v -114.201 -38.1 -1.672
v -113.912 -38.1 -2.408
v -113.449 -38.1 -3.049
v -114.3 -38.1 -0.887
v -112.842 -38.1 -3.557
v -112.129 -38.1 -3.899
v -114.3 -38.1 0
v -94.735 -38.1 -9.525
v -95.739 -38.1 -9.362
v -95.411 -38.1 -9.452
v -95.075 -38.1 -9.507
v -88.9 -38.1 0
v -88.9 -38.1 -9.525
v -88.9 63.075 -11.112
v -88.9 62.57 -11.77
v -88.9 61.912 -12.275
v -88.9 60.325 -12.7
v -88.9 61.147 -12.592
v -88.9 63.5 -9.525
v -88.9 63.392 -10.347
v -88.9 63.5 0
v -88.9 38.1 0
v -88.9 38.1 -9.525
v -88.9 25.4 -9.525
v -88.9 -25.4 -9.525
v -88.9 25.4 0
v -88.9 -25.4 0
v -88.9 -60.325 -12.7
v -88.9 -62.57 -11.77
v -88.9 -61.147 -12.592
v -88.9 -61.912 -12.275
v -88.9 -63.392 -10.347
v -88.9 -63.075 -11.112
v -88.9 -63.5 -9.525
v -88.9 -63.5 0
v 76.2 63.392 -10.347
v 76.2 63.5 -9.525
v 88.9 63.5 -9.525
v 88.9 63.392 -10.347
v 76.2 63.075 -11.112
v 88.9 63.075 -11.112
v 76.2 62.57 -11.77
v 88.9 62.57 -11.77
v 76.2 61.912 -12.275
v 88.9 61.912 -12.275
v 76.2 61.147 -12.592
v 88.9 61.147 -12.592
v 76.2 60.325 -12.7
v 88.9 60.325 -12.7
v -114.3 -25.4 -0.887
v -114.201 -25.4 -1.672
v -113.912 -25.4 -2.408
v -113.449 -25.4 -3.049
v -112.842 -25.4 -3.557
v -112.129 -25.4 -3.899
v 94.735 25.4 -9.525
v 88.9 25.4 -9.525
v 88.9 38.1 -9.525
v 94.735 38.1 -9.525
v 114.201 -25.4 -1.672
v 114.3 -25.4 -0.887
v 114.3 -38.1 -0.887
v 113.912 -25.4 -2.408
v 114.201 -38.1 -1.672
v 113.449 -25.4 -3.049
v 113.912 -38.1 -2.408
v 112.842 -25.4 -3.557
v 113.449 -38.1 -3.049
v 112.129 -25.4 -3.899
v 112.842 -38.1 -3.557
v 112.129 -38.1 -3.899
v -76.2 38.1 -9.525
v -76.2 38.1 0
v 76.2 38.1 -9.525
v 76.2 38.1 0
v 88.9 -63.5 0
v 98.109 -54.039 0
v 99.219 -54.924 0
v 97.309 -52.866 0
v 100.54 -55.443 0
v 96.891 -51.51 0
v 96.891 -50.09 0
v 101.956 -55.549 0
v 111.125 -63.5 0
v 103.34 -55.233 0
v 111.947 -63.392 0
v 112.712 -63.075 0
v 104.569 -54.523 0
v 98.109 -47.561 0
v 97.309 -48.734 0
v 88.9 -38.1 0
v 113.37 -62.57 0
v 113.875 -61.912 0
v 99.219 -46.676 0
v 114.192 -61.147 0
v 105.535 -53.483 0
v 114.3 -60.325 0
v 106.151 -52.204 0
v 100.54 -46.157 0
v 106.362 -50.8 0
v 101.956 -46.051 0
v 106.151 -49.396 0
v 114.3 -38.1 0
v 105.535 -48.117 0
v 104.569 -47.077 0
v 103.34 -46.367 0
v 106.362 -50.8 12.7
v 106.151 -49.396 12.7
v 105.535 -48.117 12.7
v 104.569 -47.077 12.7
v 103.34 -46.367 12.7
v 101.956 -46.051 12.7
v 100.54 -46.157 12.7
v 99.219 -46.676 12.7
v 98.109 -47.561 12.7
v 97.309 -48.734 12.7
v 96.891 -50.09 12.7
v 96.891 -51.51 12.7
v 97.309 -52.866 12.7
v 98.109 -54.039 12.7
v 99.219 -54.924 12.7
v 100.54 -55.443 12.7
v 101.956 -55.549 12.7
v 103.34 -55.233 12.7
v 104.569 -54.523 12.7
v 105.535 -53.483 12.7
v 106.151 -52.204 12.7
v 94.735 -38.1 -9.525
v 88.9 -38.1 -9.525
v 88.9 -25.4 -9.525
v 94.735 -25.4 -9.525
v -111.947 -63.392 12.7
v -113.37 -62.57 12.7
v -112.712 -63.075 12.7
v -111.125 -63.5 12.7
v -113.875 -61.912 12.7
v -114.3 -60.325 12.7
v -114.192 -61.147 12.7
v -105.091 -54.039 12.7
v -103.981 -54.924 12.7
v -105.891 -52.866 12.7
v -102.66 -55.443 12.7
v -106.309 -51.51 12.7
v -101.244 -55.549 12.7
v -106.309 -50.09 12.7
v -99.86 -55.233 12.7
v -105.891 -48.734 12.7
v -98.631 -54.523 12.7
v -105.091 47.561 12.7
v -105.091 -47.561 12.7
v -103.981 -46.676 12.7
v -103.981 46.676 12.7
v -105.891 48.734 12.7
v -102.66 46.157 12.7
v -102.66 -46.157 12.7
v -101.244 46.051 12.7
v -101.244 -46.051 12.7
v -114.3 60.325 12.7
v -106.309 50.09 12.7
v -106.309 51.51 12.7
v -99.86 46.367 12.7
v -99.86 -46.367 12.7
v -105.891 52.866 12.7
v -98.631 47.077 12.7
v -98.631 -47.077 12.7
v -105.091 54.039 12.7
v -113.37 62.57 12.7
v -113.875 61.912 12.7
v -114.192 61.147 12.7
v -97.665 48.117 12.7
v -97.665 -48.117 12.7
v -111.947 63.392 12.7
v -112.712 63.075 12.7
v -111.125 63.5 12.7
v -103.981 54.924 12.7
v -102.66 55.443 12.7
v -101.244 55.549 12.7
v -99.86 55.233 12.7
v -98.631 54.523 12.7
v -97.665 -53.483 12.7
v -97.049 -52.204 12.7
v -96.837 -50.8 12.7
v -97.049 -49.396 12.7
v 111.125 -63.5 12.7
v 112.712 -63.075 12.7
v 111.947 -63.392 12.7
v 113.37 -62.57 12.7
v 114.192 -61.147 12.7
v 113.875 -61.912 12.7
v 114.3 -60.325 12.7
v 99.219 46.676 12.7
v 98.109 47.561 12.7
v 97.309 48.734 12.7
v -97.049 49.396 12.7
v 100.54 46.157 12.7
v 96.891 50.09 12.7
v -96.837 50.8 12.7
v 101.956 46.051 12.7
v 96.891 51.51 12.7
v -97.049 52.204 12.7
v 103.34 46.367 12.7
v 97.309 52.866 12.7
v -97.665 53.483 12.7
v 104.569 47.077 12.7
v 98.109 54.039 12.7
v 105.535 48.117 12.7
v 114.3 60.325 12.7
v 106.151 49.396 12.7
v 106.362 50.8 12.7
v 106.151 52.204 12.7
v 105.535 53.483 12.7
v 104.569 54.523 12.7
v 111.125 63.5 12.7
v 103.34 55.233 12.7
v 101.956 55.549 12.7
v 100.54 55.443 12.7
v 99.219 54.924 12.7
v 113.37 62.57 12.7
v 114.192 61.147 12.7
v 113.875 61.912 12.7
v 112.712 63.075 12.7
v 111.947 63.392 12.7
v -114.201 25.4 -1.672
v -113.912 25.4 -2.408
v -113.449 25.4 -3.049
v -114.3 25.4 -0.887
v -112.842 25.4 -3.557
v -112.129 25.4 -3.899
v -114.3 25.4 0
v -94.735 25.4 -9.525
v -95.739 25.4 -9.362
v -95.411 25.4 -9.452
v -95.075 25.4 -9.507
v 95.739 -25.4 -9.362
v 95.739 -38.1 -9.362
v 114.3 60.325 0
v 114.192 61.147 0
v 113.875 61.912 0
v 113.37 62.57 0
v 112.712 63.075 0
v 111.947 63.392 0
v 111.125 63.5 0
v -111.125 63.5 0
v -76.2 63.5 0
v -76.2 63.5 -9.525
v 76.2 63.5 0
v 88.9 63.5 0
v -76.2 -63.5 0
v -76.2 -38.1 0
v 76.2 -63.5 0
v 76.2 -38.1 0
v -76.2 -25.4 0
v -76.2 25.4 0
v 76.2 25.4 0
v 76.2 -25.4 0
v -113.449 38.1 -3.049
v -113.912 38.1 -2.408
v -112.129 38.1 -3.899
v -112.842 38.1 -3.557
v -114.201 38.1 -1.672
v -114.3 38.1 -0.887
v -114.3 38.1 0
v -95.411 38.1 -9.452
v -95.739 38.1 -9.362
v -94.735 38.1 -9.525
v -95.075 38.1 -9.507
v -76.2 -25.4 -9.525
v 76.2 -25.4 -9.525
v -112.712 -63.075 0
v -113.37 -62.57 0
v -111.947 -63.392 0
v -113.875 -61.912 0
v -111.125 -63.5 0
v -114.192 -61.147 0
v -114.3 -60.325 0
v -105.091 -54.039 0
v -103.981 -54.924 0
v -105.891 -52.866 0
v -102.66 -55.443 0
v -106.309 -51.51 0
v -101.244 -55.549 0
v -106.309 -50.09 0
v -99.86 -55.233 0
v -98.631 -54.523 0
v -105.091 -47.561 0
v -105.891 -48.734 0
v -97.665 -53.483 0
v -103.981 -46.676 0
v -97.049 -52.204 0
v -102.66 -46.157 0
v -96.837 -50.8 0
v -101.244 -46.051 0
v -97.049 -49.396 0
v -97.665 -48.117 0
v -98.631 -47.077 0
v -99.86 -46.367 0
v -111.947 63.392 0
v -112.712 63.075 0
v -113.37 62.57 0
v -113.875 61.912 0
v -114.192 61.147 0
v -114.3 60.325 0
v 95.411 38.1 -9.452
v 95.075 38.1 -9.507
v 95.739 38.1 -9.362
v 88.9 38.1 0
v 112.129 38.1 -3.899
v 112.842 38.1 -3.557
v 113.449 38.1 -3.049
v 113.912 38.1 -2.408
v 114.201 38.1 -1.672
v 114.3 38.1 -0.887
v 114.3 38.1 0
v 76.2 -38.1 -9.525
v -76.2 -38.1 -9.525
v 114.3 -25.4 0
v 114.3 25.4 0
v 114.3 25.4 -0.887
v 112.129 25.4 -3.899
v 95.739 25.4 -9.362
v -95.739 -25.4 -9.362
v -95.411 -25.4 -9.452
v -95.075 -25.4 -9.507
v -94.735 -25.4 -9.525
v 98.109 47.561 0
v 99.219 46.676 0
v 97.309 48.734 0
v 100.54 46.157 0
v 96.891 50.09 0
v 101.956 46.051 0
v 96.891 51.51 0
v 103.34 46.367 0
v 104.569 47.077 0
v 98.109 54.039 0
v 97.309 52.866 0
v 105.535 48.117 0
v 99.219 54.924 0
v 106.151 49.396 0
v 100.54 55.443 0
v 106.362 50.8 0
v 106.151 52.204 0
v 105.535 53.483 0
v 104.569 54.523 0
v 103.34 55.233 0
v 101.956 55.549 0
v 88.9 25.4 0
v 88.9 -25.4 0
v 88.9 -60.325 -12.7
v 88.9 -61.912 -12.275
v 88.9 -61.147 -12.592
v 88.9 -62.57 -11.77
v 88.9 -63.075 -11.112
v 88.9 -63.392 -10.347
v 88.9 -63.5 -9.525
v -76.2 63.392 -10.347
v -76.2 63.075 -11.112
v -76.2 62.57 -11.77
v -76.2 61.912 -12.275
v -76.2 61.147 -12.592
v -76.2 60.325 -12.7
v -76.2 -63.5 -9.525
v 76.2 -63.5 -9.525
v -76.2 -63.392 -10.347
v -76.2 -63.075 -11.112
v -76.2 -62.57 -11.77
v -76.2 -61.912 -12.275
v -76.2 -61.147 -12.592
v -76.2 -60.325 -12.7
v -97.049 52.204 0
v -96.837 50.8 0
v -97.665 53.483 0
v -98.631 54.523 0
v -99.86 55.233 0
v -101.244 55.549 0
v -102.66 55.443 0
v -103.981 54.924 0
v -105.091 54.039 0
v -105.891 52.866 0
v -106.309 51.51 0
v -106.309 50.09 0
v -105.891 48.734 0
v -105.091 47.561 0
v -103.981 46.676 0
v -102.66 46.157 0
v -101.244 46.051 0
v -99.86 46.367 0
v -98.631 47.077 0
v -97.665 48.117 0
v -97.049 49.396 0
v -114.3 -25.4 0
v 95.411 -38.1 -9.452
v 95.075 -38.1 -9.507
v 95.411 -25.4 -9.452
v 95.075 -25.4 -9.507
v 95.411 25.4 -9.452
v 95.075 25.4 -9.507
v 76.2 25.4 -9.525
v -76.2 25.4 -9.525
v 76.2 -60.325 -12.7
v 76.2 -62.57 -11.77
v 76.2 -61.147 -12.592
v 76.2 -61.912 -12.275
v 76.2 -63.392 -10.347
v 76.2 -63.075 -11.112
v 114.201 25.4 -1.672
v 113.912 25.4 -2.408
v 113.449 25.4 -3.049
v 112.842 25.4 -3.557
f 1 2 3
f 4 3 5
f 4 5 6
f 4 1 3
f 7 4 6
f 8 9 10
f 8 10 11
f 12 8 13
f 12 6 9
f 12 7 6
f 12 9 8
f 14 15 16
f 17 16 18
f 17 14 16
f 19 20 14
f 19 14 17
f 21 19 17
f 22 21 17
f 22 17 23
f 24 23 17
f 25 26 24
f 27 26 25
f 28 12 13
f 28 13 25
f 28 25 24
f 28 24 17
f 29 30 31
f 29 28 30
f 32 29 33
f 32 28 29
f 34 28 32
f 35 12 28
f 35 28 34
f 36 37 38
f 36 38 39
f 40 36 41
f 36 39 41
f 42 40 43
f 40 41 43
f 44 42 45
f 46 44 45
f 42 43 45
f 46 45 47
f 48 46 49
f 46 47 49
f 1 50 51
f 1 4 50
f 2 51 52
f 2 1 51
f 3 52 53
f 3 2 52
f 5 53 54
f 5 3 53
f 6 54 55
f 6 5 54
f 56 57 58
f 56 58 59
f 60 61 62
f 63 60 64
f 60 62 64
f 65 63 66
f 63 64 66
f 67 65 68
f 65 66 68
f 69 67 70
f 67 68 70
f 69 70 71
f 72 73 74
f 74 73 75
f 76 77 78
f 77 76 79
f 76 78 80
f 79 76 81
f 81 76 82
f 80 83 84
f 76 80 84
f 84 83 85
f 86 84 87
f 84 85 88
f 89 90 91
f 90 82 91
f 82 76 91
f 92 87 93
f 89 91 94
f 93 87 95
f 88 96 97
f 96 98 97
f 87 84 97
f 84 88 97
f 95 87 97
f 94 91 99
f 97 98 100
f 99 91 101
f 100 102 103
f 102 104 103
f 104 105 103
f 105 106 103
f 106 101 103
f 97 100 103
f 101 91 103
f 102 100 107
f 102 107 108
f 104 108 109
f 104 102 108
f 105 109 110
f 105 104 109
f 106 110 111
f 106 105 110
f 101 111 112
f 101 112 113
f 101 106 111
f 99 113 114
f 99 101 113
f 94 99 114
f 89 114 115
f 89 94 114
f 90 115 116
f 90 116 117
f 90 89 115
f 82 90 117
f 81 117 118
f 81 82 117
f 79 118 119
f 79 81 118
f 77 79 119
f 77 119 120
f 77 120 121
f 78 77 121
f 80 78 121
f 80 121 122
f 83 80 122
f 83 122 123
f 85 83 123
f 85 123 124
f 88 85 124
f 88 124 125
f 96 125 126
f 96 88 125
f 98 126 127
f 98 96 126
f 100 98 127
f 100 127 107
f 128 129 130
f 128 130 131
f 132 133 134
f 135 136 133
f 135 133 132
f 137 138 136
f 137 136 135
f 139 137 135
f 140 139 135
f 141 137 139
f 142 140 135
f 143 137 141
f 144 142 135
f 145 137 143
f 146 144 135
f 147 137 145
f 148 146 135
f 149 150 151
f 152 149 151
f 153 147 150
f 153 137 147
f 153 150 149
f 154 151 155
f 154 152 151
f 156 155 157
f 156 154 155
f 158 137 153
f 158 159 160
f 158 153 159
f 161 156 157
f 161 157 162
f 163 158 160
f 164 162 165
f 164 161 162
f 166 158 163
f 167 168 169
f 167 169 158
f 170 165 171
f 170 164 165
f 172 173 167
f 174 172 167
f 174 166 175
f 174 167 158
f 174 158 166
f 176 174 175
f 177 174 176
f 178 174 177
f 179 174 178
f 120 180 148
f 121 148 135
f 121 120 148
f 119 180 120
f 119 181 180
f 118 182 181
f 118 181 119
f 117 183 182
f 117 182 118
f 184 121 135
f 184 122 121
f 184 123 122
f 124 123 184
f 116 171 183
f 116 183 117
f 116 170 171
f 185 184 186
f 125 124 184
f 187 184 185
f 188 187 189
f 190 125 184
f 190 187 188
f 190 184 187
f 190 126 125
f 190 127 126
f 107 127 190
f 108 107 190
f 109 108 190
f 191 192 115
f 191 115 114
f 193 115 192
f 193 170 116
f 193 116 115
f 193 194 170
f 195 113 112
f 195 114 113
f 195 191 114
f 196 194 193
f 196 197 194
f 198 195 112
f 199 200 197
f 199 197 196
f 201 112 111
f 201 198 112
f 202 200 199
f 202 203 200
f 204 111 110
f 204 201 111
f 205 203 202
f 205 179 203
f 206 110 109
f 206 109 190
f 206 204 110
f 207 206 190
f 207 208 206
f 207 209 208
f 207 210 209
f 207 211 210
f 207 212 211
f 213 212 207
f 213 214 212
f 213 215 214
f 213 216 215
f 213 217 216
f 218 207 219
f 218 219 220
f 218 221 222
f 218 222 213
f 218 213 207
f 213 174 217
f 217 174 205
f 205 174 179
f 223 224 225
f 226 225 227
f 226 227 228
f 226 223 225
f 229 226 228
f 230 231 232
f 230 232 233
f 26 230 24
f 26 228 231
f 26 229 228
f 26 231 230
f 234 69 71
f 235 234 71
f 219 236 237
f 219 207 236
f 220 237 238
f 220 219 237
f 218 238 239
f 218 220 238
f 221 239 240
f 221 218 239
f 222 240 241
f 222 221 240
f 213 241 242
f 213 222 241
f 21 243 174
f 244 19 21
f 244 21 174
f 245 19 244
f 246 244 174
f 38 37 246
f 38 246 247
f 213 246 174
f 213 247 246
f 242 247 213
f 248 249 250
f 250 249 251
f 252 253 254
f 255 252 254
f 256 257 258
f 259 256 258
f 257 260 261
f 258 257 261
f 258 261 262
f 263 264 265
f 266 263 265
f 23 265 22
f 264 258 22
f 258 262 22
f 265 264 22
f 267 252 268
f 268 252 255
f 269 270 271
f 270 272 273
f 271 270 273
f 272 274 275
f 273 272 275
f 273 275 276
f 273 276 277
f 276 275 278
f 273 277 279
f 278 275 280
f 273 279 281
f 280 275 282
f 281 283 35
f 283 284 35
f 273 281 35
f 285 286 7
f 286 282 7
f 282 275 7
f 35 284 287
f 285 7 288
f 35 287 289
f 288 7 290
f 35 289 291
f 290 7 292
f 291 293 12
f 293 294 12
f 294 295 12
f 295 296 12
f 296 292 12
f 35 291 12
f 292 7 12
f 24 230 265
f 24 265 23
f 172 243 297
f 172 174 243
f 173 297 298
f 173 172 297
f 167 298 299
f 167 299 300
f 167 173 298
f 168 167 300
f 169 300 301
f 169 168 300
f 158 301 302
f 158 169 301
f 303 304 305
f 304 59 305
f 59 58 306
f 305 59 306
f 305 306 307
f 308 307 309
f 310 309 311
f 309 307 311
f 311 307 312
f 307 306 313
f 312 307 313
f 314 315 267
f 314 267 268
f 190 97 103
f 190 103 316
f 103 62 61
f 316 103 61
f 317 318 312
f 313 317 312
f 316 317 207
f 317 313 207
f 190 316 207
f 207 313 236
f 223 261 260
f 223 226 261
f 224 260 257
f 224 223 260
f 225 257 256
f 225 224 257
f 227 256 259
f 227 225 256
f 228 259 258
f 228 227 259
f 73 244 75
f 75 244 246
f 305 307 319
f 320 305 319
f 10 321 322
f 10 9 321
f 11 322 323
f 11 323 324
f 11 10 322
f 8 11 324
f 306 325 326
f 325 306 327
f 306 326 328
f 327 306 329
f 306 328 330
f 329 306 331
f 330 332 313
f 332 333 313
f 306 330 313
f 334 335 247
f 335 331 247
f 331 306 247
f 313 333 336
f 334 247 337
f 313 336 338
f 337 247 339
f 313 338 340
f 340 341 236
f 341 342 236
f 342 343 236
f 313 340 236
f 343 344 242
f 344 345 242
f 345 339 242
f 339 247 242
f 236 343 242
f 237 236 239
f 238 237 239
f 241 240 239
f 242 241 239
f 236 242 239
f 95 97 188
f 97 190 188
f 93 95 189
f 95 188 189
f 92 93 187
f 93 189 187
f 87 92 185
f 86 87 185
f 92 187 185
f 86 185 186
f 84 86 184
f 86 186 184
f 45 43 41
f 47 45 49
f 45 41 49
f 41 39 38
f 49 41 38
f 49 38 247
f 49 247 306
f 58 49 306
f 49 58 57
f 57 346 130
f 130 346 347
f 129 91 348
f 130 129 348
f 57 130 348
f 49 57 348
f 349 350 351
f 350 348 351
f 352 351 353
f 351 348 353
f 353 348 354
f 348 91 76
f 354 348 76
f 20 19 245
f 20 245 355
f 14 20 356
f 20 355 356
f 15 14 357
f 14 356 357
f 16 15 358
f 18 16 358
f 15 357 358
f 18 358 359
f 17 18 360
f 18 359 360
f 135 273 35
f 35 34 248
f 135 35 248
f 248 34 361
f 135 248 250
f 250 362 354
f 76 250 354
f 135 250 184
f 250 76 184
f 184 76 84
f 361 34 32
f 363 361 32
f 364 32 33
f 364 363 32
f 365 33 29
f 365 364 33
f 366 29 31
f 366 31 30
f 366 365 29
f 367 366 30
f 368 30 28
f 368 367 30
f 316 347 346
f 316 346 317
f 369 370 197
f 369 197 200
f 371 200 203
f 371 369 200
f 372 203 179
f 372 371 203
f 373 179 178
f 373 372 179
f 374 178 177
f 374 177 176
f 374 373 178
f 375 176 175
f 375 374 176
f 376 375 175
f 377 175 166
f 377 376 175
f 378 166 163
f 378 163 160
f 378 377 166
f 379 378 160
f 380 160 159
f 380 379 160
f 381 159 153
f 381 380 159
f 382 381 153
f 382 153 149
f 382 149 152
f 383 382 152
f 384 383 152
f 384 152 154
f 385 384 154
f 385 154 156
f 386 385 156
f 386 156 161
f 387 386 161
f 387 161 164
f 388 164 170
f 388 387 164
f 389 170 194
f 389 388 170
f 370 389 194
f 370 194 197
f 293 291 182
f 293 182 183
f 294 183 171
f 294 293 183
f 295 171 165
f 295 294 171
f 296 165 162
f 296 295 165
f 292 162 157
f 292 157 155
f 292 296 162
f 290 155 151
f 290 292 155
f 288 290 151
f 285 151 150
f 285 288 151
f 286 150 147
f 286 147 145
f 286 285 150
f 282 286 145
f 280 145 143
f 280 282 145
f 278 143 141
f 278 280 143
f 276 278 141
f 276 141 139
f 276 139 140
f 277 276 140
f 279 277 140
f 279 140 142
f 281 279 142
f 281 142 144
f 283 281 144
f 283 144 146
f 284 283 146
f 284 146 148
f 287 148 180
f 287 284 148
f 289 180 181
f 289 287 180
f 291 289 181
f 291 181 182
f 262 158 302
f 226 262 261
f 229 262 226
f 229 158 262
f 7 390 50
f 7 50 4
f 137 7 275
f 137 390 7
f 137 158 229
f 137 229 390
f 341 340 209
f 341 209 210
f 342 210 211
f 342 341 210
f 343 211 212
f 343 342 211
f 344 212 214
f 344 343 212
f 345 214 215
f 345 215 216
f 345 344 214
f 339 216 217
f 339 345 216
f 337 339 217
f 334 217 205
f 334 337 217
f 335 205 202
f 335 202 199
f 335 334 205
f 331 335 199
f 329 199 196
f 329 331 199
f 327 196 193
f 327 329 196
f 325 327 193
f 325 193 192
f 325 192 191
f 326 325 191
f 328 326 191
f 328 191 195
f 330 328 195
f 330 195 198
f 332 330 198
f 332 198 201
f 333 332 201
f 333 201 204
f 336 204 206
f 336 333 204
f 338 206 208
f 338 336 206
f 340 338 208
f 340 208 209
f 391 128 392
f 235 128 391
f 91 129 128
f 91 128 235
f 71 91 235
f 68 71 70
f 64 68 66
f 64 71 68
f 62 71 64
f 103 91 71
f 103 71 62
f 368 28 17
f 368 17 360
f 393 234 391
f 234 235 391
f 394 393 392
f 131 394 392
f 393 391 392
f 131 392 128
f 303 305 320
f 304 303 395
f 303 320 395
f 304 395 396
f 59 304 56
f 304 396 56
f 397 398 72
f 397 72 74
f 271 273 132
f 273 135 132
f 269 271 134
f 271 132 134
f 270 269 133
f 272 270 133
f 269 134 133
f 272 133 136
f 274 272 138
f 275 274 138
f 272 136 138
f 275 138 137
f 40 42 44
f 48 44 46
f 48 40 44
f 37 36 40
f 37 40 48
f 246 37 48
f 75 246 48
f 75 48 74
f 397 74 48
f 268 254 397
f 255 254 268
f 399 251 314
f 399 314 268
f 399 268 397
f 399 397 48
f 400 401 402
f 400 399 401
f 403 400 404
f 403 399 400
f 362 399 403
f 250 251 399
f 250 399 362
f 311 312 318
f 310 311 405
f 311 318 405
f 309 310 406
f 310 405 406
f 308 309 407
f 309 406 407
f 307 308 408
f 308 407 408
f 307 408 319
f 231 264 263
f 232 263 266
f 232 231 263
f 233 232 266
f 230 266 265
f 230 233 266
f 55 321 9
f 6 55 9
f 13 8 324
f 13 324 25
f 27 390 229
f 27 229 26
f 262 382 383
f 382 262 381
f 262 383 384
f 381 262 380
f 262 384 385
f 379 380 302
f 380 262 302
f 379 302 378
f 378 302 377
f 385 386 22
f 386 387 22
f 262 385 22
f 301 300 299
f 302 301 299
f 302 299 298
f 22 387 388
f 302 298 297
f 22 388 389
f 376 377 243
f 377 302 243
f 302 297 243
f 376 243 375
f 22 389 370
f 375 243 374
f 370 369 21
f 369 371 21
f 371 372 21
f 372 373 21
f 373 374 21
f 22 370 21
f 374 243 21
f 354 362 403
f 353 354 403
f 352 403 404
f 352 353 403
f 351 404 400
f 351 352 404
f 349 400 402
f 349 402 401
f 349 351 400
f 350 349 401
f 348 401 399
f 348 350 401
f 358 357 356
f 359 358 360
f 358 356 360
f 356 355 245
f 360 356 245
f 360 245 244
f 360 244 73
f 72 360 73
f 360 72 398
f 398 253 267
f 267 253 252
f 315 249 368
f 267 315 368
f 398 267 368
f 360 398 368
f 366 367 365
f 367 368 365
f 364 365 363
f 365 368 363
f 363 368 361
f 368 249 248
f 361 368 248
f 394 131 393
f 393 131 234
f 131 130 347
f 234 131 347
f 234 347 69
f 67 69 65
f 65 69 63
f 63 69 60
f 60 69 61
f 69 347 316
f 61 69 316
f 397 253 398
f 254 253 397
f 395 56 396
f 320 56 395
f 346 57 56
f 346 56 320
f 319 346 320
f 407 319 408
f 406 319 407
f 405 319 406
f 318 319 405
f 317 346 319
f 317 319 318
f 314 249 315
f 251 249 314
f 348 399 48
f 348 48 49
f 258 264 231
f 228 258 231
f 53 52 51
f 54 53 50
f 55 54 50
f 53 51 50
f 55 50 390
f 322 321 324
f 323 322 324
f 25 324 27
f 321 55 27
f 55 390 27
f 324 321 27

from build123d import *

# Parameters (mm, degrees)
F0_W       = 228.6
F0_H       = 127
F0_R       = 4.7625
F1_DEPTH   = 12.7
F2_W       = 12.7
F2_H       = 127
F3_DEPTH   = 12.7
F4_W       = 228.6
F4_H       = 12.7
F5_DEPTH   = 9.525
F6_SIZE2   = 19.05
F6_SIZE    = 6.35
F7_R       = 3.175
F8_R       = 3.175
F9_SIZE2   = 6.35
F9_SIZE    = 19.05
F9_2_SIZE2 = 6.35
F9_2_SIZE  = 19.05
F10_R      = 3.175
F11_R      = 3.175


with BuildPart() as f1:
    # F0 (on Top) → F1 (new body)
    with BuildSketch(Plane.XY):
        Rectangle(F0_W, F0_H)
        with Locations((-101.6, -50.8)):
            Circle(F0_R, mode=Mode.SUBTRACT)
        with Locations((101.6, -50.8)):
            Circle(F0_R, mode=Mode.SUBTRACT)
        with Locations((-101.6, 50.8)):
            Circle(F0_R, mode=Mode.SUBTRACT)
        with Locations((101.6, 50.8)):
            Circle(F0_R, mode=Mode.SUBTRACT)
    extrude(amount=F1_DEPTH)

    # F2 (on face) → F3 (join)
    with BuildSketch(Plane(origin=(0, 0, 0), x_dir=(1, 0, 0), z_dir=(0, 0, -1))):
        with Locations((-82.55, 0)):
            Rectangle(F2_W, F2_H)
        with Locations((82.55, 0)):
            Rectangle(F2_W, F2_H)
    extrude(amount=F3_DEPTH)

    # F4 (on face) → F5 (join)
    with BuildSketch(Plane(origin=(0, 0, 0), x_dir=(1, 0, 0), z_dir=(0, 0, -1))):
        with Locations((0, -31.75)):
            Rectangle(F4_W, F4_H)
        with Locations((0, 31.75)):
            Rectangle(F4_W, F4_H)
    extrude(amount=F5_DEPTH)

    # F6
    f6_edges = [f1.edges().sort_by_distance(p)[0] for p in [
        (-114.3, -31.75, -9.525),
        (-114.3, 31.75, -9.525),
    ]]
    f6_side = f1.faces().sort_by_distance((-114.3, 0, 4.900543))[0]
    chamfer(f6_edges, length=F6_SIZE, length2=F6_SIZE2, reference=f6_side)

    # F7
    f7_edges = [f1.edges().sort_by_distance(p)[0] for p in [
        (-114.3, -31.75, -3.175),
        (-114.3, 31.75, -3.175),
        (-95.25, -31.75, -9.525),
        (-95.25, 31.75, -9.525),
    ]]
    fillet(f7_edges, radius=F7_R)

    # F8
    f8_edges = [f1.edges().sort_by_distance(p)[0] for p in [
        (-82.55, -63.5, -12.7),
        (-82.55, 63.5, -12.7),
        (82.55, 63.5, -12.7),
        (82.55, -63.5, -12.7),
    ]]
    fillet(f8_edges, radius=F8_R)

    # F9
    f9_edges = [f1.edges().sort_by_distance(p)[0] for p in [
        (114.3, -31.75, -9.525),
    ]]
    f9_side = f1.faces().sort_by_distance((101.6, -31.75, -9.525))[0]
    chamfer(f9_edges, length=F9_SIZE, length2=F9_SIZE2, reference=f9_side)

    # F9#2
    f9_2_edges = [f1.edges().sort_by_distance(p)[0] for p in [
        (114.3, 31.75, -9.525),
    ]]
    f9_2_side = f1.faces().sort_by_distance((101.6, 31.75, -9.525))[0]
    chamfer(f9_2_edges, length=F9_2_SIZE, length2=F9_2_SIZE2, reference=f9_2_side)

    # F10
    f10_edges = [f1.edges().sort_by_distance(p)[0] for p in [
        (114.3, -31.75, -3.175),
        (114.3, 31.75, -3.175),
        (95.25, 31.75, -9.525),
        (95.25, -31.75, -9.525),
    ]]
    fillet(f10_edges, radius=F10_R)

    # F11
    f11_edges = [f1.edges().sort_by_distance(p)[0] for p in [
        (-114.3, -63.5, 6.35),
        (-114.3, 63.5, 6.35),
        (114.3, -63.5, 6.35),
        (114.3, 63.5, 6.35),
    ]]
    fillet(f11_edges, radius=F11_R)


solid = f1.part
